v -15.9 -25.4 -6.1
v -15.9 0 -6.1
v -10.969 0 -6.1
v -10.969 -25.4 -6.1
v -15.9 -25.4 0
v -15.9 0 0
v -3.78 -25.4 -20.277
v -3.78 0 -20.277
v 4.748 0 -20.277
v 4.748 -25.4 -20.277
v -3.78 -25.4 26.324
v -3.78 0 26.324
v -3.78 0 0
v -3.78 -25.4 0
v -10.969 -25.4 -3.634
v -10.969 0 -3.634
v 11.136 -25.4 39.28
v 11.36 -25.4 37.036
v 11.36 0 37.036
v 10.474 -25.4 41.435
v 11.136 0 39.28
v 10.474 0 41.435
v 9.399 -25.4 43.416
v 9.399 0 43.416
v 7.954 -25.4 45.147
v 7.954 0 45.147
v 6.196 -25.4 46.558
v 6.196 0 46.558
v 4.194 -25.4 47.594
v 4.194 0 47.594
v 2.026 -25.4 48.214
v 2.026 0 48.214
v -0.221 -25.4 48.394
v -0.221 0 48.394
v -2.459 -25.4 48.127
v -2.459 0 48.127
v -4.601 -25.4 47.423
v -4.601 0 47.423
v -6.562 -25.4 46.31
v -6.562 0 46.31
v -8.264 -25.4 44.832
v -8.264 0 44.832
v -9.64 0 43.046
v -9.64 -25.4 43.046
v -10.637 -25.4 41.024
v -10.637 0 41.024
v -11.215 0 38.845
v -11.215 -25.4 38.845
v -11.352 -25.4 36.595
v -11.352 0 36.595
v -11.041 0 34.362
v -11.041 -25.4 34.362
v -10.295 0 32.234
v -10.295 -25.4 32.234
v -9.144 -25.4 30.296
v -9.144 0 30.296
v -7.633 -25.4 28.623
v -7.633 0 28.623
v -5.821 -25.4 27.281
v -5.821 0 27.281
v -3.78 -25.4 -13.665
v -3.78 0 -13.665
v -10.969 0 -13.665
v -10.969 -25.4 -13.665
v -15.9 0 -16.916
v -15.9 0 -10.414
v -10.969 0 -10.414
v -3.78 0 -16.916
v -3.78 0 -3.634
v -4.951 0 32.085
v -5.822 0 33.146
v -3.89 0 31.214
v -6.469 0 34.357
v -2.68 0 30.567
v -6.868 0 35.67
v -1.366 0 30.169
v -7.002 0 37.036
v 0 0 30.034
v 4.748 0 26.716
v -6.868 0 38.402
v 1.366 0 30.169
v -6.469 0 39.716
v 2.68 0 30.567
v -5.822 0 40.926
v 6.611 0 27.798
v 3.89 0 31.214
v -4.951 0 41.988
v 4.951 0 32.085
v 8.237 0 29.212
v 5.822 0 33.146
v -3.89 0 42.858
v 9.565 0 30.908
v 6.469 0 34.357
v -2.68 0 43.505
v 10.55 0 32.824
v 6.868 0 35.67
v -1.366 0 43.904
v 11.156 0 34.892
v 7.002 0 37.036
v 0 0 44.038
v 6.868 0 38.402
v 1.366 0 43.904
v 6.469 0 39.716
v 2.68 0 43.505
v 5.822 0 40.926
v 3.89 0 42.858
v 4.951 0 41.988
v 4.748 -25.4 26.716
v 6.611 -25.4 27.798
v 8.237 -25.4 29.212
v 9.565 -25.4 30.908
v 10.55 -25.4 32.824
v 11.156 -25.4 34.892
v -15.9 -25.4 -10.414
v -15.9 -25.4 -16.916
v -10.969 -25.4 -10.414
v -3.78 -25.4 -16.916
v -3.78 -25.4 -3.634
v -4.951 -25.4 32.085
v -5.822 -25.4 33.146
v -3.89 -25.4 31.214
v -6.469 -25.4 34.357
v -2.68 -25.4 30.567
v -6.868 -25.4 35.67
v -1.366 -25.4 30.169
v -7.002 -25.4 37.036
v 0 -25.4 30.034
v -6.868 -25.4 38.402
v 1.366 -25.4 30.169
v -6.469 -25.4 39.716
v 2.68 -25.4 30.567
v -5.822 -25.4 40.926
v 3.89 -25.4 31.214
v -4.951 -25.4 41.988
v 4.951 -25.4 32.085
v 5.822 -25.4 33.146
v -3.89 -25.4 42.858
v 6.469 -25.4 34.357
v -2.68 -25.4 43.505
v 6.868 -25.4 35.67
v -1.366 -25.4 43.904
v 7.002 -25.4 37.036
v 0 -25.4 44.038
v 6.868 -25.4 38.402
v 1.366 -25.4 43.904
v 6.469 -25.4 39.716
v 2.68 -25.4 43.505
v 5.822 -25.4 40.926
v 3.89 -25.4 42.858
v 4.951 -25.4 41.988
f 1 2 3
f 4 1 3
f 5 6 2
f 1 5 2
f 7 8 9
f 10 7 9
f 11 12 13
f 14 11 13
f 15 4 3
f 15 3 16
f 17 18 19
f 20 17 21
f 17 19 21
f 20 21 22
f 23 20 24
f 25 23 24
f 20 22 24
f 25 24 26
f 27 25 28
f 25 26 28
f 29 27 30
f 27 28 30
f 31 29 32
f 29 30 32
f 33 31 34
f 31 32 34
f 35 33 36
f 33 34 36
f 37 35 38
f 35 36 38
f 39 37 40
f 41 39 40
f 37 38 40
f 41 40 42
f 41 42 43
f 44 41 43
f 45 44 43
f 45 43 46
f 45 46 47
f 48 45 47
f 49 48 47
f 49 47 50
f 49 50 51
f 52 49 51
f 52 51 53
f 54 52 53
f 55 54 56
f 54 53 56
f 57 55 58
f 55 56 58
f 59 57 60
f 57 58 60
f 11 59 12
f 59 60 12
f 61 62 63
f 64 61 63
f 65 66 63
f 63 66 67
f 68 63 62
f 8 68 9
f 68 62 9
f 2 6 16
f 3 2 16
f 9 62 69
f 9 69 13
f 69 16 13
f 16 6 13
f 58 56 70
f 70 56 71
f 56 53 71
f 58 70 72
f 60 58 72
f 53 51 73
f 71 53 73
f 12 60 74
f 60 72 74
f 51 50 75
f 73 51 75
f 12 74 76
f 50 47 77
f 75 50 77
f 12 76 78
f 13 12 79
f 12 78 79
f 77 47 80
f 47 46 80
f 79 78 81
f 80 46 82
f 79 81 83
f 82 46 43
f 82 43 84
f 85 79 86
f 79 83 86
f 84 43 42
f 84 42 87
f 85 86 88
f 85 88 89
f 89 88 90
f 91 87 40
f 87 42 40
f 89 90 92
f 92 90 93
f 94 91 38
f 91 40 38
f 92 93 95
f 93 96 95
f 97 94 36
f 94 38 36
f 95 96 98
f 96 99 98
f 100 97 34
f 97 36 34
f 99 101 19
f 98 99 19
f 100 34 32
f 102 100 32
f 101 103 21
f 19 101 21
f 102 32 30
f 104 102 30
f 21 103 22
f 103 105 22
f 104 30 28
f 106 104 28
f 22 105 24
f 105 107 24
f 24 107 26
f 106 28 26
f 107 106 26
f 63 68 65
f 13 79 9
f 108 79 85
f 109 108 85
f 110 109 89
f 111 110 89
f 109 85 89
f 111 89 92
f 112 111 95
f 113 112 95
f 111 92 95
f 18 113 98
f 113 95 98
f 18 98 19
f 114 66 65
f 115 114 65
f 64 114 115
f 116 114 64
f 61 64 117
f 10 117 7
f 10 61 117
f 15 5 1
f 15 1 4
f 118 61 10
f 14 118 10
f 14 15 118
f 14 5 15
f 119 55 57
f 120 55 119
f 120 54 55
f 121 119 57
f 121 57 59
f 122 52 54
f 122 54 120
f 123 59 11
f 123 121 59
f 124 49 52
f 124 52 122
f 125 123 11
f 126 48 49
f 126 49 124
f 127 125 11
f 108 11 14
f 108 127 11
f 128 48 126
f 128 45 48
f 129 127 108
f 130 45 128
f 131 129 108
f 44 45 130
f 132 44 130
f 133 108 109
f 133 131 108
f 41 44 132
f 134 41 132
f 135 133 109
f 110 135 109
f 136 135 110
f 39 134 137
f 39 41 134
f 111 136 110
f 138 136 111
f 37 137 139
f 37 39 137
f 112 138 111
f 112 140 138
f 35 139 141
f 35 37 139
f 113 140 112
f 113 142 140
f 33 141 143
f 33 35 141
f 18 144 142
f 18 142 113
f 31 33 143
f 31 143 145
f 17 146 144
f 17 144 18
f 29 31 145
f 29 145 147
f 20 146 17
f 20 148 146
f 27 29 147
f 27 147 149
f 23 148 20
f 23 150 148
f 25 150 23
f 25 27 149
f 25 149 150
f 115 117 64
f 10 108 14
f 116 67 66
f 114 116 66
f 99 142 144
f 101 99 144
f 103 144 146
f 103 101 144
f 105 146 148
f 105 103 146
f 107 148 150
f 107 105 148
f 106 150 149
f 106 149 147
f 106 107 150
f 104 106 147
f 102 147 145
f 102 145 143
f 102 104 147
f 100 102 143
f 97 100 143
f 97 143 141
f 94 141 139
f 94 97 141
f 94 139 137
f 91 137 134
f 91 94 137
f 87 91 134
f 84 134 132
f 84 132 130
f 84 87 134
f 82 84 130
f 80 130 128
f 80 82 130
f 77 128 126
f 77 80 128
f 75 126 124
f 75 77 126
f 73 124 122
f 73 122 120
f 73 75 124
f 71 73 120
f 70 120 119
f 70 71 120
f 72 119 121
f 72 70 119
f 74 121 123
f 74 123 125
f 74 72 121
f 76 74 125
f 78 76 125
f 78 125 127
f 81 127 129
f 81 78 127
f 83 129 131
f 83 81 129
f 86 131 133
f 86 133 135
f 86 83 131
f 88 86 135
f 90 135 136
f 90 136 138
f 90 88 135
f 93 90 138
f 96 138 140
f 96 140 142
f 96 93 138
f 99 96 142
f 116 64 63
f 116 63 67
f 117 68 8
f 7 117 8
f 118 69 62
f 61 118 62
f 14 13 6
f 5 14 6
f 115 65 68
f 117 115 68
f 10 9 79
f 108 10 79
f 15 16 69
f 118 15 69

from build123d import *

# Parameters (mm, degrees)
F0_R     = 7.002159
F1_DEPTH = 25.4


with BuildPart() as f1:
    # F0 (on Front) → F1 (new body)
    with BuildSketch(Plane.XZ):
        with BuildLine():
            ThreePointArc((4.748446, 26.716104), (9.565493, 30.908048), (11.360195, 37.036292))
            ThreePointArc((11.360195, 37.036292), (-6.561535, 46.309926), (-3.78044, 26.323575))
            ThreePointArc((-3.78044, 26.323575), (0.522282, 25.688109), (4.748446, 26.716104))
        make_face()
        with Locations((0, 37.036292)):
            Circle(F0_R, mode=Mode.SUBTRACT)
        with BuildLine():
            ThreePointArc((4.748446, 26.716104), (0.522282, 25.688109), (-3.78044, 26.323575))
            Line((-3.78044, 26.323575), (-3.78044, 0))
            Line((-3.78044, 0), (-3.78044, -3.634142))
            Line((-3.78044, -3.634142), (-3.78044, -13.665396))
            Line((-3.78044, -13.665396), (-3.78044, -16.9164))
            Line((-3.78044, -16.9164), (-3.78044, -20.276576))
            Line((-3.78044, -20.276576), (4.748446, -20.276576))
            Line((4.748446, -20.276576), (4.748446, 26.716104))
        make_face()
        Polygon((-3.78044, -3.634142), (-3.78044, 0), (-15.900498, 0), (-15.900498, -6.099688), (-10.969408, -6.099688), (-10.969408, -3.634142), align=None)
        Polygon((-3.78044, -16.9164), (-3.78044, -13.665396), (-10.969408, -13.665396), (-10.969408, -10.414393), (-15.900498, -10.414393), (-15.900498, -16.9164), align=None)
    extrude(amount=F1_DEPTH)


solid = f1.part
